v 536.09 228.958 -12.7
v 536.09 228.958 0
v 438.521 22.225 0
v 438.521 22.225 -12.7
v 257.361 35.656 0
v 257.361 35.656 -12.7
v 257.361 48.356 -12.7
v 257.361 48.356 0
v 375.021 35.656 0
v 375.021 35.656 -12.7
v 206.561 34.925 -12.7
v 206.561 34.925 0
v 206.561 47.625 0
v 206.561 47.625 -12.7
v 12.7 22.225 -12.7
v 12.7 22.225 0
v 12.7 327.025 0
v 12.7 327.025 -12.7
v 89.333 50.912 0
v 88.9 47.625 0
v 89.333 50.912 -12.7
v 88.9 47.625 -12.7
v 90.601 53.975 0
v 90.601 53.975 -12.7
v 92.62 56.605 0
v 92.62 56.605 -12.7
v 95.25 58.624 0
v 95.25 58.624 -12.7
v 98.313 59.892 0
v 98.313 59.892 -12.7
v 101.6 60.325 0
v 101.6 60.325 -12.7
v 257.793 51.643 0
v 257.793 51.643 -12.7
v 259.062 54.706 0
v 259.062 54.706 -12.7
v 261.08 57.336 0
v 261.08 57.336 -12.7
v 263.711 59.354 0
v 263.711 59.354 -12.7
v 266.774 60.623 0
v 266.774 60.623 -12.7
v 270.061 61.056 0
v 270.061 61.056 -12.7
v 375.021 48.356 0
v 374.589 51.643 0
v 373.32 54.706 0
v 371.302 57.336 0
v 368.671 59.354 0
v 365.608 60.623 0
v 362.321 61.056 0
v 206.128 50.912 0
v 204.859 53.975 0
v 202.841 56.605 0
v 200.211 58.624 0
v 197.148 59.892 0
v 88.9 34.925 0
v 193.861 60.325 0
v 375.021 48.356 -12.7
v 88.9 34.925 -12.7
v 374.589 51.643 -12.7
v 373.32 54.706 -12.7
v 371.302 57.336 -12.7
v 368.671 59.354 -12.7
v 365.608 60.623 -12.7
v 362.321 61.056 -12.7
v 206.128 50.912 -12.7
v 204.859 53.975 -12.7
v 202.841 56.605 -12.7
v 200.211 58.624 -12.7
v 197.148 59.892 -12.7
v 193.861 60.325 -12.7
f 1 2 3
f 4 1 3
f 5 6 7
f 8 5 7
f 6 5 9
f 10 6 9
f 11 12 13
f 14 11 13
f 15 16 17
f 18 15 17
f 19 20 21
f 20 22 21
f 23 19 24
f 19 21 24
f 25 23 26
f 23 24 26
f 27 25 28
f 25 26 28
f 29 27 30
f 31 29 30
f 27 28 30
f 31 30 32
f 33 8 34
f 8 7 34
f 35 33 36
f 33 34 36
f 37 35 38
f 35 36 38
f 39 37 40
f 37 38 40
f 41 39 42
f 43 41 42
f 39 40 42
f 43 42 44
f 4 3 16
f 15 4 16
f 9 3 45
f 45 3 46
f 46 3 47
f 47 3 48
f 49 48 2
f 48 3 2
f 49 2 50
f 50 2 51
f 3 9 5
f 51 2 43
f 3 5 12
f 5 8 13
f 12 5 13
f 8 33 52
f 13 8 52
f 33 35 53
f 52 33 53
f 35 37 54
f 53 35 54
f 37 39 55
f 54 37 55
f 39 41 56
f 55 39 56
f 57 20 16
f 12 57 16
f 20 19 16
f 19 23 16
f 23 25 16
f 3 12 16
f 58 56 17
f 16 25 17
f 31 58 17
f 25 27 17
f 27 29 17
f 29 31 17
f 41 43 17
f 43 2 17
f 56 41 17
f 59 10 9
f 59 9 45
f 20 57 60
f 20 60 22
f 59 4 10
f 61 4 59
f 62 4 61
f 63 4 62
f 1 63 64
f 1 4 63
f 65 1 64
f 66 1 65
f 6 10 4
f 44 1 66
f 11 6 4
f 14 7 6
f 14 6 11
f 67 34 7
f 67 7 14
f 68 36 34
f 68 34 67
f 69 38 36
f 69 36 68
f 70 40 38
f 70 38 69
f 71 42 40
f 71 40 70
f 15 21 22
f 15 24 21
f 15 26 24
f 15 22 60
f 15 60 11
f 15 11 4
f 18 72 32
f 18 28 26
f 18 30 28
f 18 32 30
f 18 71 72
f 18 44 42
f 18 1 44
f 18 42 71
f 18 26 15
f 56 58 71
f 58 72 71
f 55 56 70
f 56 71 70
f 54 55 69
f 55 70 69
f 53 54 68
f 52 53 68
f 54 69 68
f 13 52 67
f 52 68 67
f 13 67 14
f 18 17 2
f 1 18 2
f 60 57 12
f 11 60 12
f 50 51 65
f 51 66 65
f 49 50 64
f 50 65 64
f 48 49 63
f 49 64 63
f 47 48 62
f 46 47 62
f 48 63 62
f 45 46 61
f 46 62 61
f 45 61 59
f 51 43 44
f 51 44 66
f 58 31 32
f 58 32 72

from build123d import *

# Parameters (mm, degrees)
BOSS_EXTRUDE1_DEPTH = 12.7
SKETCH2_W           = 117.66064382
SKETCH2_H           = 25.4
CUT_EXTRUDE1_DEPTH  = 13.7
FILLET1_R           = 12.7


with BuildPart() as part:
    # Sketch1 → Boss-Extrude1 (new body)
    with BuildSketch(Plane.XY):
        Polygon((12.7, 22.225), (12.7, 327.025), (536.089806585, 228.957542458), (438.52128764, 22.225), align=None)
    extrude(amount=-BOSS_EXTRUDE1_DEPTH)

    # Sketch2 → Cut-Extrude1 (cut, through all)
    with BuildSketch(Plane.XY):
        with Locations((147.73032191, 47.625)):
            Rectangle(SKETCH2_W, SKETCH2_H)
        with Locations((316.19096573, 48.355687107)):
            Rectangle(SKETCH2_W, SKETCH2_H)
    extrude(amount=-CUT_EXTRUDE1_DEPTH, mode=Mode.SUBTRACT)

    # Fillet1
    fillet1_edges = [part.edges().sort_by_distance(p)[0] for p in [
        (88.9, 60.325, -6.35),
        (206.56064382, 60.325, -6.35),
        (257.36064382, 61.055687107, -6.35),
        (375.02128764, 61.055687107, -6.35),
    ]]
    fillet(fillet1_edges, radius=FILLET1_R)


solid = part.part
